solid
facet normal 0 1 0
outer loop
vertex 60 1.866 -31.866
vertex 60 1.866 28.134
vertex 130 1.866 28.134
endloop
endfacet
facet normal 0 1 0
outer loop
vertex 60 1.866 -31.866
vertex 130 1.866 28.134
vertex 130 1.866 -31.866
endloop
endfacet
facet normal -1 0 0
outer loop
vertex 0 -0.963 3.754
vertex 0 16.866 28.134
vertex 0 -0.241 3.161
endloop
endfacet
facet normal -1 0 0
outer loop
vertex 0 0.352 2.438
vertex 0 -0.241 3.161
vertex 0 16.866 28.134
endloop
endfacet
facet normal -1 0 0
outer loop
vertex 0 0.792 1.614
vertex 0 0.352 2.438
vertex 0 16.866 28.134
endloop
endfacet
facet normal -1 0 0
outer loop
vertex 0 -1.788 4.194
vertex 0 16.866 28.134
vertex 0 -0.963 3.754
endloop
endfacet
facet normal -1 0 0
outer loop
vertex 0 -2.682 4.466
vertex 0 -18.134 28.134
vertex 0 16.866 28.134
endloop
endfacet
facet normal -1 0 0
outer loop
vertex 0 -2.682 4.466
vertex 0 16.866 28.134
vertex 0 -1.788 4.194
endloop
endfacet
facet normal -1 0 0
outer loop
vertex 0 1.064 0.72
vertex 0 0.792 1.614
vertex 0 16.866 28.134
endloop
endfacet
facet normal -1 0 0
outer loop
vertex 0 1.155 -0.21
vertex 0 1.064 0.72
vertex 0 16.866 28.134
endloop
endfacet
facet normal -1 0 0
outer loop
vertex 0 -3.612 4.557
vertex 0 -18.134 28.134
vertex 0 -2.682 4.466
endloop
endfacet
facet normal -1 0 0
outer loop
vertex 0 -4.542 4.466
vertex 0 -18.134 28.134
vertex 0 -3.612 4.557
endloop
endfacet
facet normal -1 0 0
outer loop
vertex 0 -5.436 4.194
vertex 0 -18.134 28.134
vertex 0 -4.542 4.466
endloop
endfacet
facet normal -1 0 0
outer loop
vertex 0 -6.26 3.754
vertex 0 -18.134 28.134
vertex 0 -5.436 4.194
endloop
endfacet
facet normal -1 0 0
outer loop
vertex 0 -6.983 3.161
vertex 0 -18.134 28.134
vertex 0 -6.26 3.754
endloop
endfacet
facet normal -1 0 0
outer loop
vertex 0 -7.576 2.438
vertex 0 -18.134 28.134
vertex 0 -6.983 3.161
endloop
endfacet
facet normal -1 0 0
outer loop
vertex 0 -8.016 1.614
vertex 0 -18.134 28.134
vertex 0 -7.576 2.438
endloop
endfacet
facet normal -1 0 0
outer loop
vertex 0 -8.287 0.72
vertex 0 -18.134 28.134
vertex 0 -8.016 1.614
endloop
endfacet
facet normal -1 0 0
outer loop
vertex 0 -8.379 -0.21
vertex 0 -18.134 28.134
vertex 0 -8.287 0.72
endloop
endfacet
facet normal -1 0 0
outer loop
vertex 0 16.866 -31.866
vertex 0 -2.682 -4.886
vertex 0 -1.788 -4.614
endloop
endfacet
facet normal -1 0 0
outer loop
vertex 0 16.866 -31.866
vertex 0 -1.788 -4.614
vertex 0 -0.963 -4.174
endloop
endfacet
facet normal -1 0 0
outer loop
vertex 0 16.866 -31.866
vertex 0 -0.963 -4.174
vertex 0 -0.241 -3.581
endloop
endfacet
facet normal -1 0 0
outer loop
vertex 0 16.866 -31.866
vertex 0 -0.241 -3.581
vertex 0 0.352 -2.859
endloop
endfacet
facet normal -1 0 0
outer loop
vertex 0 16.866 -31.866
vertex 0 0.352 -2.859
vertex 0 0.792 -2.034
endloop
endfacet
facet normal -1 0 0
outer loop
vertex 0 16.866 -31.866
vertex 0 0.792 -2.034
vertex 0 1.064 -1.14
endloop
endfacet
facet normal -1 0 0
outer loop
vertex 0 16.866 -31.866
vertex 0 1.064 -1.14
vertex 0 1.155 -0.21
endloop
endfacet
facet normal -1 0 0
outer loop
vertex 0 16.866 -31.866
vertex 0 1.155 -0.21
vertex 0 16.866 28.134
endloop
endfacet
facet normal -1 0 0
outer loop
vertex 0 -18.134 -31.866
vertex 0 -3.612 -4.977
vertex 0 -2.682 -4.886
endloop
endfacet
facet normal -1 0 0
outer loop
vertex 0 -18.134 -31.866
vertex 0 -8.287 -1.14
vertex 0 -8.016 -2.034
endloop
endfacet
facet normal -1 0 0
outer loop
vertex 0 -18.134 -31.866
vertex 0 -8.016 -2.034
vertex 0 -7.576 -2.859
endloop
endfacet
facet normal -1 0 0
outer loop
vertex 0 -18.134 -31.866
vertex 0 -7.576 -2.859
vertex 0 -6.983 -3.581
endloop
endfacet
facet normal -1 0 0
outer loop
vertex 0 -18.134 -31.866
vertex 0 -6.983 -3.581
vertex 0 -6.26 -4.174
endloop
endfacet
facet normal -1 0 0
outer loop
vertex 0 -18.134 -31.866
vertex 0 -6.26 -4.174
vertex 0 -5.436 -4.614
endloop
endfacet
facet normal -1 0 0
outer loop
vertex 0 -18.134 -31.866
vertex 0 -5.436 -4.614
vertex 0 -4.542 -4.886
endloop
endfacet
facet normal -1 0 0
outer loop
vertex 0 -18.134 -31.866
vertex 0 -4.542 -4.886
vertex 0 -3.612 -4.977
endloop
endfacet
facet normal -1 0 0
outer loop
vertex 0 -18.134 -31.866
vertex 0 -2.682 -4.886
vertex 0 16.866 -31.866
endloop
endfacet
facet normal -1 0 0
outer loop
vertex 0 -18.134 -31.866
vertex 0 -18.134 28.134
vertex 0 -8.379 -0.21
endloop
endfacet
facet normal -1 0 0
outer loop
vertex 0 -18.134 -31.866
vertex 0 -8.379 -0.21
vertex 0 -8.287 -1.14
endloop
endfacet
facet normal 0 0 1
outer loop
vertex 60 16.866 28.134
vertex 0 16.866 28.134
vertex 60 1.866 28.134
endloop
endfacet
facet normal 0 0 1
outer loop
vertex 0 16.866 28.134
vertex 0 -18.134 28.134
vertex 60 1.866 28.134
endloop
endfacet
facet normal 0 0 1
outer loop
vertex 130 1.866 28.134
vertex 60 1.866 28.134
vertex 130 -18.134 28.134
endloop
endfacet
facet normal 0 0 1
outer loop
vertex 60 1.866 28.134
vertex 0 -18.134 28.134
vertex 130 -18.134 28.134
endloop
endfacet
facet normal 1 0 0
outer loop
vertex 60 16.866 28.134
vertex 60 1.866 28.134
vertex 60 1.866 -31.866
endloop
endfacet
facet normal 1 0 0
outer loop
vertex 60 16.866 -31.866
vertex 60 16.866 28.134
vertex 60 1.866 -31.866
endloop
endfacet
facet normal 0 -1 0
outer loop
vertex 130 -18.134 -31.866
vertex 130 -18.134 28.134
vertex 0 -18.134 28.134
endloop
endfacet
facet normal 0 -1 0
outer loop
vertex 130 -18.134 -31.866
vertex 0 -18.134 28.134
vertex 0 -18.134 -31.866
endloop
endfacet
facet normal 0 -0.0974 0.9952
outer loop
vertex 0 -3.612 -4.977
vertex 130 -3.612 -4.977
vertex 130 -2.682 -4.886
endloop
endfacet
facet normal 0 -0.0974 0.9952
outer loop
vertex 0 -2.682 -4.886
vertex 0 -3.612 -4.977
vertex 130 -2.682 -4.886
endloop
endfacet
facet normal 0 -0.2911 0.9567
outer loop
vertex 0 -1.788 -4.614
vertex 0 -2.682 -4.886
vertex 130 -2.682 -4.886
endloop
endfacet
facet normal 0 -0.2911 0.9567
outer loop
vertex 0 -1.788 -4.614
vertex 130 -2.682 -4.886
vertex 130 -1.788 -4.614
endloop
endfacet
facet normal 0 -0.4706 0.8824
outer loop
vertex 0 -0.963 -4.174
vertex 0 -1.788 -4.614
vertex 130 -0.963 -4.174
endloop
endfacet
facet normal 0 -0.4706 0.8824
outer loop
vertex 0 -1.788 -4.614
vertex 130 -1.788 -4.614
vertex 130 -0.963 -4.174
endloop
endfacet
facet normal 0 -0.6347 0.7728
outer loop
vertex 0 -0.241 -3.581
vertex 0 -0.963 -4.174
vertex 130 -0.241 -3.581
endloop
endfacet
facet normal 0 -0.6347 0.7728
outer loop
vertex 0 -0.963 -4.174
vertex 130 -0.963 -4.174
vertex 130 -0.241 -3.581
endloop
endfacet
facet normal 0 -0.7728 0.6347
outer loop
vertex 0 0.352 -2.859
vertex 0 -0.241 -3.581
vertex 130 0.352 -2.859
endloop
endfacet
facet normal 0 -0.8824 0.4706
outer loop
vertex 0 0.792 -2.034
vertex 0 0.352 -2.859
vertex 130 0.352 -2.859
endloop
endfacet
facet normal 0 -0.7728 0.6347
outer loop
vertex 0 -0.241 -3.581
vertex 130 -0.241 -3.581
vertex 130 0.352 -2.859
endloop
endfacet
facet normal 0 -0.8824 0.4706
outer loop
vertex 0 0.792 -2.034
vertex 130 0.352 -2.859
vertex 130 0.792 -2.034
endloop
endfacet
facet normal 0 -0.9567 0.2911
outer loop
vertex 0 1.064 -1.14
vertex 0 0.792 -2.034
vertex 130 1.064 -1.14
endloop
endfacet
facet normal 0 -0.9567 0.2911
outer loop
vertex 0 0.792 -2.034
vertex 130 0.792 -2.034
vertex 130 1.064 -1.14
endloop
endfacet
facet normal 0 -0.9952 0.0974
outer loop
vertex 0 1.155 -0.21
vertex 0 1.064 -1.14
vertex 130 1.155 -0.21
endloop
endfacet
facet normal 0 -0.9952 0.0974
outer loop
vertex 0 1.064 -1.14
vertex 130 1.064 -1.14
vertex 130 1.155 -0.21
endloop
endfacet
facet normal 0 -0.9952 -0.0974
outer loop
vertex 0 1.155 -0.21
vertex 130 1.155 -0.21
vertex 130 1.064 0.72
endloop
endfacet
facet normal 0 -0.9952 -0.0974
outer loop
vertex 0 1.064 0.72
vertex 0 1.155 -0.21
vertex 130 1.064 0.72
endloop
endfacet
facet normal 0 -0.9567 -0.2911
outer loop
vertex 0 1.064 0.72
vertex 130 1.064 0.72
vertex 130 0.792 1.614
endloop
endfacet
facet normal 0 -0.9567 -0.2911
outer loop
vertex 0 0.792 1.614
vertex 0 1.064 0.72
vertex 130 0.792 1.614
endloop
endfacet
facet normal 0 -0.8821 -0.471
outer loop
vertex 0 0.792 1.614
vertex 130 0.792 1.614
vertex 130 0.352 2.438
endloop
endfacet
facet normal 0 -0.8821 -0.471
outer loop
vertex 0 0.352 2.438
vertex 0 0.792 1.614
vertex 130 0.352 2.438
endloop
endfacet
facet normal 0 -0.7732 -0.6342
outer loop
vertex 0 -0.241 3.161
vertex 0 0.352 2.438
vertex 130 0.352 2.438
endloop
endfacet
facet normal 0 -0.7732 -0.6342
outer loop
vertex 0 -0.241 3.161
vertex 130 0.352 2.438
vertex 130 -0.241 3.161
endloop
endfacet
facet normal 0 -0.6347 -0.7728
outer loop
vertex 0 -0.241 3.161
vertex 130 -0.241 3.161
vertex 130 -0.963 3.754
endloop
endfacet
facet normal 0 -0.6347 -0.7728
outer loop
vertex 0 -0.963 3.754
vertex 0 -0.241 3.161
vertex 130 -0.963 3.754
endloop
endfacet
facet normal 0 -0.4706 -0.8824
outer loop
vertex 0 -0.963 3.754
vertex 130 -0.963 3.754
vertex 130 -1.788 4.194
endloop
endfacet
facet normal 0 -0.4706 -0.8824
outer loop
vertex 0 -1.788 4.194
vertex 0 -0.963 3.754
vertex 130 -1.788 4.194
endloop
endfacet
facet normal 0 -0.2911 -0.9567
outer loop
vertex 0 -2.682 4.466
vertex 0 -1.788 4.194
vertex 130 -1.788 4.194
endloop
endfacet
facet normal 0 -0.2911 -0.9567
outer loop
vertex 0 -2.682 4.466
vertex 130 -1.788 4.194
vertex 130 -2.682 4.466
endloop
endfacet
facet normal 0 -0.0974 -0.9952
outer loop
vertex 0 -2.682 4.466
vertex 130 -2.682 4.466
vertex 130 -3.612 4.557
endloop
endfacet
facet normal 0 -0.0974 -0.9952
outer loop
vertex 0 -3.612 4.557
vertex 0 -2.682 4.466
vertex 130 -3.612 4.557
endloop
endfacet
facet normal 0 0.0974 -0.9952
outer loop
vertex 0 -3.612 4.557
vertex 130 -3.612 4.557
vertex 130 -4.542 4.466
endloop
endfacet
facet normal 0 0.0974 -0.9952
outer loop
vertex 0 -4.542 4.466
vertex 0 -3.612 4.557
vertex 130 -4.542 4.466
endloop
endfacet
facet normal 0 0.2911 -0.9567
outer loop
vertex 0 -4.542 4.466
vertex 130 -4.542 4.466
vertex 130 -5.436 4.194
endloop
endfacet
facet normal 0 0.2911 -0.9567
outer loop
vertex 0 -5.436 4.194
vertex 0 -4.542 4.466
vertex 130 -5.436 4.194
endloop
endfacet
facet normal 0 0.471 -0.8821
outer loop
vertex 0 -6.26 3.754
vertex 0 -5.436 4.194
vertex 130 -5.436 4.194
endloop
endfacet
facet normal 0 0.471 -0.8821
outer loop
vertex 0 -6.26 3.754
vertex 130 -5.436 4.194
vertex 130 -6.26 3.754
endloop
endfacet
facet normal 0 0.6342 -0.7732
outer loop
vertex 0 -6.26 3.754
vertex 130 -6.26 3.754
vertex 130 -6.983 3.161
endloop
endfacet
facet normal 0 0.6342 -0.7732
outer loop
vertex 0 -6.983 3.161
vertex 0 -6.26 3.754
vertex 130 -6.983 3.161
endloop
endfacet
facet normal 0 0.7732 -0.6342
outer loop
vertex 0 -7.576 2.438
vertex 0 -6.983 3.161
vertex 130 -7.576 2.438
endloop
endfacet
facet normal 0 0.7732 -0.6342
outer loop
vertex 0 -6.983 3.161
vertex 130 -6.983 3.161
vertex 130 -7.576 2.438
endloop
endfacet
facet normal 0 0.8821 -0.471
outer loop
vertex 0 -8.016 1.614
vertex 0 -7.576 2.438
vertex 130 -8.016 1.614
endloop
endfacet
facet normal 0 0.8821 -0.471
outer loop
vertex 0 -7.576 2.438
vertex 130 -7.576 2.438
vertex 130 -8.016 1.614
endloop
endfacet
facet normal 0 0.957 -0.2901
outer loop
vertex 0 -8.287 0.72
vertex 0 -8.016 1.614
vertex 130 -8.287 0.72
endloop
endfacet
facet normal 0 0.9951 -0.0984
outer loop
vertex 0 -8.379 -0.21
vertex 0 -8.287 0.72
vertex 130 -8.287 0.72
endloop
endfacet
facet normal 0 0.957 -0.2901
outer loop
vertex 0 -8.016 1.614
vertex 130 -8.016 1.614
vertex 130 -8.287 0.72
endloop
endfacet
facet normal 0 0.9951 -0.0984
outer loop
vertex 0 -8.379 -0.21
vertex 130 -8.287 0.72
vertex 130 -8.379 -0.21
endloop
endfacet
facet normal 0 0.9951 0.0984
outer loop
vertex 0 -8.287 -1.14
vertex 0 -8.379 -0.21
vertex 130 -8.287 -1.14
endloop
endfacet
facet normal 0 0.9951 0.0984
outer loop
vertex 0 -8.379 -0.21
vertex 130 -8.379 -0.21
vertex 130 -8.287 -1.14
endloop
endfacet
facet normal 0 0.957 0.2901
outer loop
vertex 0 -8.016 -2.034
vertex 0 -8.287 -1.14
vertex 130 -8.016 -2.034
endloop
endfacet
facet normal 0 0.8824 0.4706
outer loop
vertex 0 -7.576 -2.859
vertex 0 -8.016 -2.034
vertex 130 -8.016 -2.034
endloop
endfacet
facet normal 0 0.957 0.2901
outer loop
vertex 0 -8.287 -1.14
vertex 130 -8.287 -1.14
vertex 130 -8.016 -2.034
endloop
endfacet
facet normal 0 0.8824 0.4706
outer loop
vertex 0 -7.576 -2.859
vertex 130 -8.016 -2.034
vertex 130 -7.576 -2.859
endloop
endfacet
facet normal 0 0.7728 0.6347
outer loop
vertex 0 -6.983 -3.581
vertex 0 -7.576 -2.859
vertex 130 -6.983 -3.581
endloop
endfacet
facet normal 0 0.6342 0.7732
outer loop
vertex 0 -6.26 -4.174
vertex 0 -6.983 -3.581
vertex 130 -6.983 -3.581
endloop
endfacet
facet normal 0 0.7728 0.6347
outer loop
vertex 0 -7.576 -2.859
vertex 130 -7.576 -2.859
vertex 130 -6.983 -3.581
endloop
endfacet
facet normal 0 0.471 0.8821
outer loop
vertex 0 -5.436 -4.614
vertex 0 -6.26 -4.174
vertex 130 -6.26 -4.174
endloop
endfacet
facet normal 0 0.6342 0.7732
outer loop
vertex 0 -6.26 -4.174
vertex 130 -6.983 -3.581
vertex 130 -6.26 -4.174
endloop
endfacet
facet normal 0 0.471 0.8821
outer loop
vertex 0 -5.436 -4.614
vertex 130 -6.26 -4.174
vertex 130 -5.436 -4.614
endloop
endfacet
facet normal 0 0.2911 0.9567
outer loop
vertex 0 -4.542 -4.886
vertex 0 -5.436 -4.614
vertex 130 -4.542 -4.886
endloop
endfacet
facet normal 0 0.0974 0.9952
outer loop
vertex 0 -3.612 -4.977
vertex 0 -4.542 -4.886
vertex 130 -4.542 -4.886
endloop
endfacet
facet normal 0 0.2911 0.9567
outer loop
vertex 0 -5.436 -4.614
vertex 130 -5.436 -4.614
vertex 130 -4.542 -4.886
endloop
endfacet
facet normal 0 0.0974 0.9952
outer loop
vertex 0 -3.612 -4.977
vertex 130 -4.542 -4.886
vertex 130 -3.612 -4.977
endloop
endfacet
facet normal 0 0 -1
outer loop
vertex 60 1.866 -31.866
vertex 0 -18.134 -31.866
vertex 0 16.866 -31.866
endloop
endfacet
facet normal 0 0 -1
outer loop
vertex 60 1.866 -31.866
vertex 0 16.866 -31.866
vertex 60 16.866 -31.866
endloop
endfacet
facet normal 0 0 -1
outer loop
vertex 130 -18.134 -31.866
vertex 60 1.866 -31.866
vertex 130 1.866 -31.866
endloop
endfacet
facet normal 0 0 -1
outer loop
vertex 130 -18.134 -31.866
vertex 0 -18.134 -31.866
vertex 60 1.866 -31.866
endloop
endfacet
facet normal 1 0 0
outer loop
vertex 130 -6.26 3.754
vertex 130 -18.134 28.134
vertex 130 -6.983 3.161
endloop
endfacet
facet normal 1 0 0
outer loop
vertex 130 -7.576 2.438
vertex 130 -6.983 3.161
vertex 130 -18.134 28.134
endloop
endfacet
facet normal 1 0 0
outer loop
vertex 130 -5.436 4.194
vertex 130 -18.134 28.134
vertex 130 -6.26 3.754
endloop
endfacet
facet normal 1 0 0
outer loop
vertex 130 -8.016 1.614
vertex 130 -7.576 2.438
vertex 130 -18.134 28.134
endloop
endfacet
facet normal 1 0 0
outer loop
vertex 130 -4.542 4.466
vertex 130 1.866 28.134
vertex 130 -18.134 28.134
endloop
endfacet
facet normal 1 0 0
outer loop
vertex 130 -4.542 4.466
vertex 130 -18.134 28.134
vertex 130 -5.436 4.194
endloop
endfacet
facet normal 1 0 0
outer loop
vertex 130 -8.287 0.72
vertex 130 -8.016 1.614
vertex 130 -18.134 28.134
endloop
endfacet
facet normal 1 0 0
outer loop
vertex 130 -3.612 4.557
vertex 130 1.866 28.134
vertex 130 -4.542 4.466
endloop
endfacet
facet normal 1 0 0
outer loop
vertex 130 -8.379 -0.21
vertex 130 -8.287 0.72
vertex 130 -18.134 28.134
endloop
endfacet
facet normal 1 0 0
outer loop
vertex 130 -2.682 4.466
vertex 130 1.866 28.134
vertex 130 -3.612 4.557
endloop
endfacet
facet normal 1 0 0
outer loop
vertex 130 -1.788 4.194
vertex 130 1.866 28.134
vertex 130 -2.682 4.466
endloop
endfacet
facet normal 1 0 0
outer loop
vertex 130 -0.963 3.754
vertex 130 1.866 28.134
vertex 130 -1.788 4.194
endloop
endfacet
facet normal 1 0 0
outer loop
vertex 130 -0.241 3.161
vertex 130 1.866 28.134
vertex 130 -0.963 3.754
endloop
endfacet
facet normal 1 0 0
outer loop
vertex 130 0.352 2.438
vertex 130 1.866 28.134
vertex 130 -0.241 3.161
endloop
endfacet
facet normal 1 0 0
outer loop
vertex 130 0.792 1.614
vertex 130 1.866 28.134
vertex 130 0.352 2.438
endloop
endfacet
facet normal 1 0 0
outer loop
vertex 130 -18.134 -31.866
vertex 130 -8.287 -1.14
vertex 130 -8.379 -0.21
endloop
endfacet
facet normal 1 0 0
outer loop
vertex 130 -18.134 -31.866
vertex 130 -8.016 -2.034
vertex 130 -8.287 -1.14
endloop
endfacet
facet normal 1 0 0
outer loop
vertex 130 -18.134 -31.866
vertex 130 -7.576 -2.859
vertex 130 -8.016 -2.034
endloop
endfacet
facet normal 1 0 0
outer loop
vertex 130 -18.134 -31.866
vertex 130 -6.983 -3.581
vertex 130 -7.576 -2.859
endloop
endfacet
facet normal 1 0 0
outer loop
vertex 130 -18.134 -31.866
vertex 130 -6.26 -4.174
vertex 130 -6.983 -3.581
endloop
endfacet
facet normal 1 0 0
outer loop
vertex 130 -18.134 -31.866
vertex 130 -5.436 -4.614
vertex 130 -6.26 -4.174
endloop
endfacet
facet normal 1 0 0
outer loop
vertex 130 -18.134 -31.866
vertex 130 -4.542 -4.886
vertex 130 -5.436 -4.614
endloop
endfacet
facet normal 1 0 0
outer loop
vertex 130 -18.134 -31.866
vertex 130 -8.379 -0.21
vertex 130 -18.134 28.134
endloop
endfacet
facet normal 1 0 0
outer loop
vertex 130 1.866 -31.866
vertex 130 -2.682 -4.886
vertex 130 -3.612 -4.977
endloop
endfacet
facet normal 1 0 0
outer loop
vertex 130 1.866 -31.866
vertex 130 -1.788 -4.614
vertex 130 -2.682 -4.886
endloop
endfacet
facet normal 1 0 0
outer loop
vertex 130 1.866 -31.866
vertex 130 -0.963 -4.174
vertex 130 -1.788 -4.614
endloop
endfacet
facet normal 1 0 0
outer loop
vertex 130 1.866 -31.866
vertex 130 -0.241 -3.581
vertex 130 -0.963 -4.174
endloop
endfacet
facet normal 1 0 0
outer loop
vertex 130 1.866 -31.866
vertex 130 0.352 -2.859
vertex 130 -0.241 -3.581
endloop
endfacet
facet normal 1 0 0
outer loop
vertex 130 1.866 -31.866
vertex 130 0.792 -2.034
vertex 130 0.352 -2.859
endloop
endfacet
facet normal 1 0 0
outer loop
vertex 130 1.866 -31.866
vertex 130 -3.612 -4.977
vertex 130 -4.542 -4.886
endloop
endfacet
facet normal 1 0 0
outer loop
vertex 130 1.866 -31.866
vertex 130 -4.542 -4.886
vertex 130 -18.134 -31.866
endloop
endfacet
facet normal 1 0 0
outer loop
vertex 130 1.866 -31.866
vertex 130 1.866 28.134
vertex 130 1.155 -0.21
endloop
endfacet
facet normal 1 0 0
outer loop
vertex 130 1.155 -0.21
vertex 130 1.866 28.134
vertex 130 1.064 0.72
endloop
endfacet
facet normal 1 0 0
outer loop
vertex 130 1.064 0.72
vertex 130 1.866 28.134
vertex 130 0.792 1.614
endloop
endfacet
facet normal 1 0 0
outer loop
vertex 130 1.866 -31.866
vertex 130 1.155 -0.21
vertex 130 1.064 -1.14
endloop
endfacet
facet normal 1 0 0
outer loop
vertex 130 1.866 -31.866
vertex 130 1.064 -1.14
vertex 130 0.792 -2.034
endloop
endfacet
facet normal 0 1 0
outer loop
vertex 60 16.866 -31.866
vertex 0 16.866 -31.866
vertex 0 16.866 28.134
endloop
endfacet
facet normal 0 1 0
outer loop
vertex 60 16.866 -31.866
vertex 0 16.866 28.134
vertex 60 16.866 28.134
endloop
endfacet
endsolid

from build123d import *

# Parameters (mm, degrees)
SKETCH1_W           = 60
SKETCH1_H           = 20
BOSS_EXTRUDE1_DEPTH = 130
SKETCH2_W           = 60
SKETCH2_H           = 60
BOSS_EXTRUDE2_DEPTH = 15
SKETCH3_R           = 4.767204383
CUT_EXTRUDE1_DEPTH  = 200


with BuildPart() as part:
    # Sketch1 → Boss-Extrude1 (new body)
    with BuildSketch(Plane(origin=(0, 0, 0), x_dir=(0, 0, -1), z_dir=(1, 0, 0))):
        with Locations((1.866028708, -8.133971292)):
            Rectangle(SKETCH1_W, SKETCH1_H)
    extrude(amount=BOSS_EXTRUDE1_DEPTH)

    # Sketch2 → Boss-Extrude2 (add)
    with BuildSketch(Plane(origin=(0, 1.866028708, 0), x_dir=(1, 0, 0), z_dir=(0, 1, 0))):
        with Locations((30, 1.866028708)):
            Rectangle(SKETCH2_W, SKETCH2_H)
    extrude(amount=BOSS_EXTRUDE2_DEPTH)

    # Sketch3 → Cut-Extrude1 (cut)
    with BuildSketch(Plane(origin=(130, 0, 0), x_dir=(0, 0, -1), z_dir=(1, 0, 0))):
        with Locations((0.210093723, -3.611871182)):
            Circle(SKETCH3_R)
    extrude(amount=-CUT_EXTRUDE1_DEPTH, mode=Mode.SUBTRACT)


solid = part.part
